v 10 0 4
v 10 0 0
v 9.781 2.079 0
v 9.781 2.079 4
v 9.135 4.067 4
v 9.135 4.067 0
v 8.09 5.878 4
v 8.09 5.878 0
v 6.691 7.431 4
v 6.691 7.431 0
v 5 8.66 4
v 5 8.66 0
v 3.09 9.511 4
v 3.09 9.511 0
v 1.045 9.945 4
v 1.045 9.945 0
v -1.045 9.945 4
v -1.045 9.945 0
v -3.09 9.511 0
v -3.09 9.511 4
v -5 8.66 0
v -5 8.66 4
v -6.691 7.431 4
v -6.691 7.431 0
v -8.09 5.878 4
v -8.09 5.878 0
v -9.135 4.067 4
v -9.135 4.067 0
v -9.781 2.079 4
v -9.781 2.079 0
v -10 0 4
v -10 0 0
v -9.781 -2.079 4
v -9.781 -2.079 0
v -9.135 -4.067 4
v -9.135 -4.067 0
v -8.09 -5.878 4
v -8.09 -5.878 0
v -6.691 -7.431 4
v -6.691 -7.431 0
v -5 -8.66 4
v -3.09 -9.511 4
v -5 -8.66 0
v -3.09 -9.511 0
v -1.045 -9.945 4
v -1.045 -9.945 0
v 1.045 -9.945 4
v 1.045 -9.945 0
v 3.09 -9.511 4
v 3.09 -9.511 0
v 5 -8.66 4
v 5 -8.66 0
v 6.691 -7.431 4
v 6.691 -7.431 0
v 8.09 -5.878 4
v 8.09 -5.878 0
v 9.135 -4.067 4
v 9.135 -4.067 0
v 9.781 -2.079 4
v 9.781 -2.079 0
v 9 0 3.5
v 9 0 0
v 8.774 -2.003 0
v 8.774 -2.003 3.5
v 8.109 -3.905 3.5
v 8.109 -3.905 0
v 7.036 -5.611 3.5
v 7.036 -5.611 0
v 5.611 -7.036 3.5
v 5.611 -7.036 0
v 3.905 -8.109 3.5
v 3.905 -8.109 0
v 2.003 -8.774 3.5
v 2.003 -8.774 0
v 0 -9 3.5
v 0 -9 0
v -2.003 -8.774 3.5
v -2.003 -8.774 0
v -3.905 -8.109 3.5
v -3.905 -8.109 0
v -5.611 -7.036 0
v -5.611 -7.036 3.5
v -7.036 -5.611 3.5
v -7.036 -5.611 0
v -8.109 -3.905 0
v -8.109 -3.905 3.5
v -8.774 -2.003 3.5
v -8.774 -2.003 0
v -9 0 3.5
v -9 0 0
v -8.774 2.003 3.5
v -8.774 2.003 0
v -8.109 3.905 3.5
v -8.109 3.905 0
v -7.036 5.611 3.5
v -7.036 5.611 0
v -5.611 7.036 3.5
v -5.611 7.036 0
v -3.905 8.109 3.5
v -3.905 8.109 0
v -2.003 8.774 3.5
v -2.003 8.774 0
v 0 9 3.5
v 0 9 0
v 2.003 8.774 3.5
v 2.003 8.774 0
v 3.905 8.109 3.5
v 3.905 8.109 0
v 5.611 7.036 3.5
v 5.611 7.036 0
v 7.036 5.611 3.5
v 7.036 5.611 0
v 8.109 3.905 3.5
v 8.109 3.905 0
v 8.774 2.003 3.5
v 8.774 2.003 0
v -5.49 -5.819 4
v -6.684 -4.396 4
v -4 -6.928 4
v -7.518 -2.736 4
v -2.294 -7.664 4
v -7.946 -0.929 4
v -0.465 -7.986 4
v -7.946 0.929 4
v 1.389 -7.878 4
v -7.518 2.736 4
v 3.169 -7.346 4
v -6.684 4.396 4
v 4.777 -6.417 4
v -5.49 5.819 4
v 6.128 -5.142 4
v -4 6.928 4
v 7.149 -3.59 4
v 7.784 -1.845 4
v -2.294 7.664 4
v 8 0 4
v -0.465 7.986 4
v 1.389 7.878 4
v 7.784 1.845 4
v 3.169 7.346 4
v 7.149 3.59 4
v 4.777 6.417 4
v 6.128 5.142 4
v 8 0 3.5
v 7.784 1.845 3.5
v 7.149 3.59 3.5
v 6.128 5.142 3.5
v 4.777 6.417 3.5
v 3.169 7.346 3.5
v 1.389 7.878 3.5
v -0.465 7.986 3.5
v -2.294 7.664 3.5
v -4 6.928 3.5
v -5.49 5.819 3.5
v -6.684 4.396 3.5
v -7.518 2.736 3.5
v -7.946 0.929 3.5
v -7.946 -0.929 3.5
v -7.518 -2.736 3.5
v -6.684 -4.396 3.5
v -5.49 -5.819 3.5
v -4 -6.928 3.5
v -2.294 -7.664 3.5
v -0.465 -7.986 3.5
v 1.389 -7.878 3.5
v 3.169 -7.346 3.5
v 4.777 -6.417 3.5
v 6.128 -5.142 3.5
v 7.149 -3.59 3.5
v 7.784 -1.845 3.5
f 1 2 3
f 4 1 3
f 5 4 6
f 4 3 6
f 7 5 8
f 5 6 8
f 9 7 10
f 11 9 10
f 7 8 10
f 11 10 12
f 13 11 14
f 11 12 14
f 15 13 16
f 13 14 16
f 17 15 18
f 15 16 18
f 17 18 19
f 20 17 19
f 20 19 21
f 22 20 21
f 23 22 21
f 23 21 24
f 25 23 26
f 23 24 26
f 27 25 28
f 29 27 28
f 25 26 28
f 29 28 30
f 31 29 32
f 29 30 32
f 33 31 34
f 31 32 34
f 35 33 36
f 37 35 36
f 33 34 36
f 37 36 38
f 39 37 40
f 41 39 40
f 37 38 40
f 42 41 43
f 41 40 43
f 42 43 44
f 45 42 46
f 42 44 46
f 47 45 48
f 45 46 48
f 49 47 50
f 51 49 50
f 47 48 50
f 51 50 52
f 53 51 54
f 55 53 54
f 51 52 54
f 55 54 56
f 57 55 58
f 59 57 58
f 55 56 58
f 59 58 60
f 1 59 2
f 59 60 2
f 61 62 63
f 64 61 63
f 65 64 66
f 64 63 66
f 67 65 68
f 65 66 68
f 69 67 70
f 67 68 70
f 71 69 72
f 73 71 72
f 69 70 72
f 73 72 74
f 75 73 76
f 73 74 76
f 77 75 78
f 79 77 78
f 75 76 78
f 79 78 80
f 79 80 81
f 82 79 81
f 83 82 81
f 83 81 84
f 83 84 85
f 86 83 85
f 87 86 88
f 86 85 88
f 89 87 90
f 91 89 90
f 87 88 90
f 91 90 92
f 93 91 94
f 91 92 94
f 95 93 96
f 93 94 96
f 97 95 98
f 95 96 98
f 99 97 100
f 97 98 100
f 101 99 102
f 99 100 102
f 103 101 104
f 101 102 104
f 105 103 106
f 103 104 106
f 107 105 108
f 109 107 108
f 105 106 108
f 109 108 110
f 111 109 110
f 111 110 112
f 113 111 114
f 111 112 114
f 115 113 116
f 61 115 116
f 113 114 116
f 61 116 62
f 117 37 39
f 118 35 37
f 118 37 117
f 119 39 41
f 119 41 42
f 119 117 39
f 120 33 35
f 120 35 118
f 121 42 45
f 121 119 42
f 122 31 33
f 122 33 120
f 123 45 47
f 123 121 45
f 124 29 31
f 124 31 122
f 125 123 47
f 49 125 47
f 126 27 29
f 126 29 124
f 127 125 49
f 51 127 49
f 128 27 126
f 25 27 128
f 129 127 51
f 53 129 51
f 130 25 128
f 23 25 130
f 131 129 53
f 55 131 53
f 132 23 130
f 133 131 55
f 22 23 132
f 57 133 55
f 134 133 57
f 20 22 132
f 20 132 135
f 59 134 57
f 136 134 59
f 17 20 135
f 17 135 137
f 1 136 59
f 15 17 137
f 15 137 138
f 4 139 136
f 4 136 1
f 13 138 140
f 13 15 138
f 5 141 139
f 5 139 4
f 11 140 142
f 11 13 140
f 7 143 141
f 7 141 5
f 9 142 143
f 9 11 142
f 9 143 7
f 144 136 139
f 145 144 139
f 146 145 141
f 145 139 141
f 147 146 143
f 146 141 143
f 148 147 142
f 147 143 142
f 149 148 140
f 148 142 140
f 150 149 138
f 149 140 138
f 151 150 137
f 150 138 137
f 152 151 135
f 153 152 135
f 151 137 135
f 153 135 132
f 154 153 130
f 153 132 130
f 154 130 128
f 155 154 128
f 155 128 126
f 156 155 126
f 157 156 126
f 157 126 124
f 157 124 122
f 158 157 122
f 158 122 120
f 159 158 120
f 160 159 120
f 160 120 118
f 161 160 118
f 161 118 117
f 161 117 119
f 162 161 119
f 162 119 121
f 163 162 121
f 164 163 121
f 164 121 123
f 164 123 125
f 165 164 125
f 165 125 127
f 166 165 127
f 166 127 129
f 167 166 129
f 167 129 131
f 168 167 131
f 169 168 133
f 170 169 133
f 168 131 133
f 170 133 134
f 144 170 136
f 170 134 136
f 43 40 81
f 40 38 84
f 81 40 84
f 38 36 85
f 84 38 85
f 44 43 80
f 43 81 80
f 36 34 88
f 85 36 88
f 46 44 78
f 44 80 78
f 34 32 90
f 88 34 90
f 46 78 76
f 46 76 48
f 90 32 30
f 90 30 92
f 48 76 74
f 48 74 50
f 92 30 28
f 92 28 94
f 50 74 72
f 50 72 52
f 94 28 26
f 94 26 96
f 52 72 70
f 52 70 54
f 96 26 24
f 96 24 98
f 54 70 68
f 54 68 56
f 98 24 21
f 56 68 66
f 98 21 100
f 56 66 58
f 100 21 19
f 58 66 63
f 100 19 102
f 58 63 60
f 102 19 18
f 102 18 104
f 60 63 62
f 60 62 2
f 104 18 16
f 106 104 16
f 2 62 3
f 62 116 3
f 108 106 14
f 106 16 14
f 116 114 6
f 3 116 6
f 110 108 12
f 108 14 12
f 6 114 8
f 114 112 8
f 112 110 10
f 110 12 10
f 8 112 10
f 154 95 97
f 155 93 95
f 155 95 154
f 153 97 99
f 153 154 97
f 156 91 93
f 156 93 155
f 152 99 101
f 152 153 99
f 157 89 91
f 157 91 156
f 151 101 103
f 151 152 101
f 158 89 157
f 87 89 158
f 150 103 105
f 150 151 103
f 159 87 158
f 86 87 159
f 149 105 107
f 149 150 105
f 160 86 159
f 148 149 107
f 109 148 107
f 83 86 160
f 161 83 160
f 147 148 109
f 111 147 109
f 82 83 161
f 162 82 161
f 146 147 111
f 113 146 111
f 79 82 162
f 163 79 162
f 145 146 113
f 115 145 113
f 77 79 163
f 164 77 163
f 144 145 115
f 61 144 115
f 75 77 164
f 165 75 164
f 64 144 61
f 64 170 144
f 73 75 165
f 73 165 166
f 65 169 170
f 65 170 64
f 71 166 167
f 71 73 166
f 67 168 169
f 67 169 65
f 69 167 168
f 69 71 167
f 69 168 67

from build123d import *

# Parameters (mm, degrees)
F0_R     = 10
F1_DEPTH = 4
F2_R     = 8
F3_DEPTH = 25
F4_R     = 9
F5_DEPTH = 3.5


with BuildPart() as f1:
    # F0 (on Top) → F1 (new body)
    with BuildSketch(Plane.XY):
        Circle(F0_R)
    extrude(amount=F1_DEPTH)

    # F2 (on face) → F3 (cut)
    with BuildSketch(Plane.XY.offset(4)):
        Circle(F2_R)
    extrude(amount=-F3_DEPTH, mode=Mode.SUBTRACT)

    # F4 (on face) → F5 (cut)
    with BuildSketch(Plane(origin=(0, 0, 0), x_dir=(1, 0, 0), z_dir=(0, 0, -1))):
        Circle(F4_R)
    extrude(amount=-F5_DEPTH, mode=Mode.SUBTRACT)


solid = f1.part
